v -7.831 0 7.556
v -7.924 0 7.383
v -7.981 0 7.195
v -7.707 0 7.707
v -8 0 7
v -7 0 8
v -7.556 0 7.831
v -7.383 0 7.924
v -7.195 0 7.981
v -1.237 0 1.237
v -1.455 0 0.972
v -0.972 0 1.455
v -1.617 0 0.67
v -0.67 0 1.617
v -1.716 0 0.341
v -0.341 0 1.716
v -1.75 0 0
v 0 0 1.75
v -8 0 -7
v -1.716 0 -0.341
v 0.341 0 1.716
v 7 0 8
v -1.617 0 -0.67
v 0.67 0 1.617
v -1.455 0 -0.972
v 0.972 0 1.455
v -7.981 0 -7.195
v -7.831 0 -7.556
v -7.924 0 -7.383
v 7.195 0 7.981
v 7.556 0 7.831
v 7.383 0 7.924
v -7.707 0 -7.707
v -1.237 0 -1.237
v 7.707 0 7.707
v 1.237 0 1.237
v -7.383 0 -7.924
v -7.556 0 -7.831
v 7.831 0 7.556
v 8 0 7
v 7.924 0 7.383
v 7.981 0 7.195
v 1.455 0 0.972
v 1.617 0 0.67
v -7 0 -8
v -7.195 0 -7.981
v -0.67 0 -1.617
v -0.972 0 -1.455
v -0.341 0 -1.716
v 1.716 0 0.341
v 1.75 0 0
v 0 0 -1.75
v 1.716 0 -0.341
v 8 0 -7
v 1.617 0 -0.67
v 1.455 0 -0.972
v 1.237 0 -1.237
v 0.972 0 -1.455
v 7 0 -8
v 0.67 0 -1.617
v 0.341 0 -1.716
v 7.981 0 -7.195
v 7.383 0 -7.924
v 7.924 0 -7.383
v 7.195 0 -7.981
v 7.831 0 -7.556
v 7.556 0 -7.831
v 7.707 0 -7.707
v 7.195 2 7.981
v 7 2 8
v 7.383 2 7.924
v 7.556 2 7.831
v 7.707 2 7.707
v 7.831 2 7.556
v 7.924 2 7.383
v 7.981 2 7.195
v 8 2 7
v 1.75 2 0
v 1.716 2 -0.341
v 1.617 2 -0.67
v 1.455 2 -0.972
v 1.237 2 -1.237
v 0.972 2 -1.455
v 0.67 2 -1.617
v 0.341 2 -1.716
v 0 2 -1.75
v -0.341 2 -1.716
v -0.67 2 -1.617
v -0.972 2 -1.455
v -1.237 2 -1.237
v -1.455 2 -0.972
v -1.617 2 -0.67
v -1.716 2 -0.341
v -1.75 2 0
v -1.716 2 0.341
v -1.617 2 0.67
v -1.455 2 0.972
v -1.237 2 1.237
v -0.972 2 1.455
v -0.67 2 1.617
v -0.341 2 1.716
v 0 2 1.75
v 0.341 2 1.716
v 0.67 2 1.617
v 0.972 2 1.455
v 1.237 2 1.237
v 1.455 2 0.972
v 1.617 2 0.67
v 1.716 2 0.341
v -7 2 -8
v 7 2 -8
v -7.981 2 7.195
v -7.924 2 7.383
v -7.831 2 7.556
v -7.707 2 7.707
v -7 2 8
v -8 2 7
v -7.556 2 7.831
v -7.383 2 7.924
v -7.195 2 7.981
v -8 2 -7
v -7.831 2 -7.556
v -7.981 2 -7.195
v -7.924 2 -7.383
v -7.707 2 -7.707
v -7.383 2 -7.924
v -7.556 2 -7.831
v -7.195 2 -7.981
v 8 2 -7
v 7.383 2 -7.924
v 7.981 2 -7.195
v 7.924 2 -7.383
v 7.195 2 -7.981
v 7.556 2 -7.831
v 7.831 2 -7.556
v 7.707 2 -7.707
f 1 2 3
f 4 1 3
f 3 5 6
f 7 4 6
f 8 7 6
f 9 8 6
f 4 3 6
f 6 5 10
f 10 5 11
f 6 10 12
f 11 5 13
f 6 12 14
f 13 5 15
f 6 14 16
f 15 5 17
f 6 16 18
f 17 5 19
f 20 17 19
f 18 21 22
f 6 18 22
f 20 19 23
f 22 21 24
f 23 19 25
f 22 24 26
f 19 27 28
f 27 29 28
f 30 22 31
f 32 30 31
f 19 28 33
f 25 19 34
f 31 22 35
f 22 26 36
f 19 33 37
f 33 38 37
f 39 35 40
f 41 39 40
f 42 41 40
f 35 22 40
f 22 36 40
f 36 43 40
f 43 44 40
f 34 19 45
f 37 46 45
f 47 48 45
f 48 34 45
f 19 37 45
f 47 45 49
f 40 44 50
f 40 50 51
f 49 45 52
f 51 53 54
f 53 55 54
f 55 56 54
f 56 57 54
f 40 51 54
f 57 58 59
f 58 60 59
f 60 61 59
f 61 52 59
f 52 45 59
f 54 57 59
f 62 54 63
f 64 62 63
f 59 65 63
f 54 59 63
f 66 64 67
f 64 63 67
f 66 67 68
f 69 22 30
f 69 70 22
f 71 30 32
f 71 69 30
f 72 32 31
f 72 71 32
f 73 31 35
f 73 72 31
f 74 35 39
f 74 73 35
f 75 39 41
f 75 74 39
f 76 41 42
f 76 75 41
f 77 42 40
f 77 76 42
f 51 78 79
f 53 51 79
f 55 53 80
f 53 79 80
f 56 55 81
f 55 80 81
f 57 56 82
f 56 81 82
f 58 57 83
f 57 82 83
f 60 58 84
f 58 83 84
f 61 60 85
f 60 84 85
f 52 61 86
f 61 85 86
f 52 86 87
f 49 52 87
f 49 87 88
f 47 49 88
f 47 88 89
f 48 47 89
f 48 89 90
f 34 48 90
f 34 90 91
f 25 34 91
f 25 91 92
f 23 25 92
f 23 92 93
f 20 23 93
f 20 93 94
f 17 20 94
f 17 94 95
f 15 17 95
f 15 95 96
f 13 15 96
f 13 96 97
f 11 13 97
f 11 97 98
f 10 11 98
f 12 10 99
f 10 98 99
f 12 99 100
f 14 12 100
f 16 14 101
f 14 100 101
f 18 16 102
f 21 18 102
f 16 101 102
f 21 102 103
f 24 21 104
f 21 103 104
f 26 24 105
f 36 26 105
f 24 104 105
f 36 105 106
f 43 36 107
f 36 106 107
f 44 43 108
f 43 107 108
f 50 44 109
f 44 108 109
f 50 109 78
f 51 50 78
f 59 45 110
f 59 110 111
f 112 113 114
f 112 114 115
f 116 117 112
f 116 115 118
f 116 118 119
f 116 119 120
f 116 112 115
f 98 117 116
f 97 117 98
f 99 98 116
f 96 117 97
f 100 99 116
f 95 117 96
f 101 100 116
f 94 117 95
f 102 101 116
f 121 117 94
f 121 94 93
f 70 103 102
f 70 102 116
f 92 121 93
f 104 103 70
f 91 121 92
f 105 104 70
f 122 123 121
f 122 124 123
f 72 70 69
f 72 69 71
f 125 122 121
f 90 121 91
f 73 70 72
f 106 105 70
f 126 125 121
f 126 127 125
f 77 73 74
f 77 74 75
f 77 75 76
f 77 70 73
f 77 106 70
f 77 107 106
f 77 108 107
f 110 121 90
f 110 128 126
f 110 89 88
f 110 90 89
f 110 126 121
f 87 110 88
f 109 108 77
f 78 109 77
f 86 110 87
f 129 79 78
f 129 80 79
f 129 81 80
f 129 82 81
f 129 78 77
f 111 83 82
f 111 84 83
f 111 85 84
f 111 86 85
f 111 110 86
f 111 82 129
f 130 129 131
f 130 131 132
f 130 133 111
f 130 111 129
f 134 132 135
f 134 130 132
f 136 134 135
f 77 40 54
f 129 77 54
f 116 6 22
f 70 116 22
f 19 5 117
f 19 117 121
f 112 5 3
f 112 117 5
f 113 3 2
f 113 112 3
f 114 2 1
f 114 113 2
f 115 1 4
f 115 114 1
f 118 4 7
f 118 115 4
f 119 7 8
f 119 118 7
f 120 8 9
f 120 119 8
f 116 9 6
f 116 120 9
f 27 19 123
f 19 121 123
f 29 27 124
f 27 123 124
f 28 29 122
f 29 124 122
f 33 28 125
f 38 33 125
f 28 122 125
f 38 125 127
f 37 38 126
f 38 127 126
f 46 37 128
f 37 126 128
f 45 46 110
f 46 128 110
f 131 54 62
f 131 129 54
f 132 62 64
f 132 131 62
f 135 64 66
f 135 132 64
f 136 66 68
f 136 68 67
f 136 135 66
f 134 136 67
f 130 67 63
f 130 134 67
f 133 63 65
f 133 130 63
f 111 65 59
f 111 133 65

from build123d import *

# Parameters (mm, degrees)
SKETCH1_W           = 16
SKETCH1_H           = 16
BOSS_EXTRUDE1_DEPTH = 2
FILLET1_R           = 1
SKETCH2_R           = 1.75
CUT_EXTRUDE1_DEPTH  = 3


with BuildPart() as part:
    # Sketch1 → Boss-Extrude1 (new body)
    with BuildSketch(Plane(origin=(0, 0, 0), x_dir=(1, 0, 0), z_dir=(0, 1, 0))):
        Rectangle(SKETCH1_W, SKETCH1_H)
    extrude(amount=BOSS_EXTRUDE1_DEPTH)

    # Fillet1
    fillet1_edges = [part.edges().sort_by_distance(p)[0] for p in [
        (8, 1, 8),
        (-8, 1, 8),
        (-8, 1, -8),
        (8, 1, -8),
    ]]
    fillet(fillet1_edges, radius=FILLET1_R)

    # Sketch2 → Cut-Extrude1 (cut, through all)
    with BuildSketch(Plane(origin=(0, 2, 0), x_dir=(1, 0, 0), z_dir=(0, 1, 0))):
        Circle(SKETCH2_R)
    extrude(amount=-CUT_EXTRUDE1_DEPTH, mode=Mode.SUBTRACT)


solid = part.part
